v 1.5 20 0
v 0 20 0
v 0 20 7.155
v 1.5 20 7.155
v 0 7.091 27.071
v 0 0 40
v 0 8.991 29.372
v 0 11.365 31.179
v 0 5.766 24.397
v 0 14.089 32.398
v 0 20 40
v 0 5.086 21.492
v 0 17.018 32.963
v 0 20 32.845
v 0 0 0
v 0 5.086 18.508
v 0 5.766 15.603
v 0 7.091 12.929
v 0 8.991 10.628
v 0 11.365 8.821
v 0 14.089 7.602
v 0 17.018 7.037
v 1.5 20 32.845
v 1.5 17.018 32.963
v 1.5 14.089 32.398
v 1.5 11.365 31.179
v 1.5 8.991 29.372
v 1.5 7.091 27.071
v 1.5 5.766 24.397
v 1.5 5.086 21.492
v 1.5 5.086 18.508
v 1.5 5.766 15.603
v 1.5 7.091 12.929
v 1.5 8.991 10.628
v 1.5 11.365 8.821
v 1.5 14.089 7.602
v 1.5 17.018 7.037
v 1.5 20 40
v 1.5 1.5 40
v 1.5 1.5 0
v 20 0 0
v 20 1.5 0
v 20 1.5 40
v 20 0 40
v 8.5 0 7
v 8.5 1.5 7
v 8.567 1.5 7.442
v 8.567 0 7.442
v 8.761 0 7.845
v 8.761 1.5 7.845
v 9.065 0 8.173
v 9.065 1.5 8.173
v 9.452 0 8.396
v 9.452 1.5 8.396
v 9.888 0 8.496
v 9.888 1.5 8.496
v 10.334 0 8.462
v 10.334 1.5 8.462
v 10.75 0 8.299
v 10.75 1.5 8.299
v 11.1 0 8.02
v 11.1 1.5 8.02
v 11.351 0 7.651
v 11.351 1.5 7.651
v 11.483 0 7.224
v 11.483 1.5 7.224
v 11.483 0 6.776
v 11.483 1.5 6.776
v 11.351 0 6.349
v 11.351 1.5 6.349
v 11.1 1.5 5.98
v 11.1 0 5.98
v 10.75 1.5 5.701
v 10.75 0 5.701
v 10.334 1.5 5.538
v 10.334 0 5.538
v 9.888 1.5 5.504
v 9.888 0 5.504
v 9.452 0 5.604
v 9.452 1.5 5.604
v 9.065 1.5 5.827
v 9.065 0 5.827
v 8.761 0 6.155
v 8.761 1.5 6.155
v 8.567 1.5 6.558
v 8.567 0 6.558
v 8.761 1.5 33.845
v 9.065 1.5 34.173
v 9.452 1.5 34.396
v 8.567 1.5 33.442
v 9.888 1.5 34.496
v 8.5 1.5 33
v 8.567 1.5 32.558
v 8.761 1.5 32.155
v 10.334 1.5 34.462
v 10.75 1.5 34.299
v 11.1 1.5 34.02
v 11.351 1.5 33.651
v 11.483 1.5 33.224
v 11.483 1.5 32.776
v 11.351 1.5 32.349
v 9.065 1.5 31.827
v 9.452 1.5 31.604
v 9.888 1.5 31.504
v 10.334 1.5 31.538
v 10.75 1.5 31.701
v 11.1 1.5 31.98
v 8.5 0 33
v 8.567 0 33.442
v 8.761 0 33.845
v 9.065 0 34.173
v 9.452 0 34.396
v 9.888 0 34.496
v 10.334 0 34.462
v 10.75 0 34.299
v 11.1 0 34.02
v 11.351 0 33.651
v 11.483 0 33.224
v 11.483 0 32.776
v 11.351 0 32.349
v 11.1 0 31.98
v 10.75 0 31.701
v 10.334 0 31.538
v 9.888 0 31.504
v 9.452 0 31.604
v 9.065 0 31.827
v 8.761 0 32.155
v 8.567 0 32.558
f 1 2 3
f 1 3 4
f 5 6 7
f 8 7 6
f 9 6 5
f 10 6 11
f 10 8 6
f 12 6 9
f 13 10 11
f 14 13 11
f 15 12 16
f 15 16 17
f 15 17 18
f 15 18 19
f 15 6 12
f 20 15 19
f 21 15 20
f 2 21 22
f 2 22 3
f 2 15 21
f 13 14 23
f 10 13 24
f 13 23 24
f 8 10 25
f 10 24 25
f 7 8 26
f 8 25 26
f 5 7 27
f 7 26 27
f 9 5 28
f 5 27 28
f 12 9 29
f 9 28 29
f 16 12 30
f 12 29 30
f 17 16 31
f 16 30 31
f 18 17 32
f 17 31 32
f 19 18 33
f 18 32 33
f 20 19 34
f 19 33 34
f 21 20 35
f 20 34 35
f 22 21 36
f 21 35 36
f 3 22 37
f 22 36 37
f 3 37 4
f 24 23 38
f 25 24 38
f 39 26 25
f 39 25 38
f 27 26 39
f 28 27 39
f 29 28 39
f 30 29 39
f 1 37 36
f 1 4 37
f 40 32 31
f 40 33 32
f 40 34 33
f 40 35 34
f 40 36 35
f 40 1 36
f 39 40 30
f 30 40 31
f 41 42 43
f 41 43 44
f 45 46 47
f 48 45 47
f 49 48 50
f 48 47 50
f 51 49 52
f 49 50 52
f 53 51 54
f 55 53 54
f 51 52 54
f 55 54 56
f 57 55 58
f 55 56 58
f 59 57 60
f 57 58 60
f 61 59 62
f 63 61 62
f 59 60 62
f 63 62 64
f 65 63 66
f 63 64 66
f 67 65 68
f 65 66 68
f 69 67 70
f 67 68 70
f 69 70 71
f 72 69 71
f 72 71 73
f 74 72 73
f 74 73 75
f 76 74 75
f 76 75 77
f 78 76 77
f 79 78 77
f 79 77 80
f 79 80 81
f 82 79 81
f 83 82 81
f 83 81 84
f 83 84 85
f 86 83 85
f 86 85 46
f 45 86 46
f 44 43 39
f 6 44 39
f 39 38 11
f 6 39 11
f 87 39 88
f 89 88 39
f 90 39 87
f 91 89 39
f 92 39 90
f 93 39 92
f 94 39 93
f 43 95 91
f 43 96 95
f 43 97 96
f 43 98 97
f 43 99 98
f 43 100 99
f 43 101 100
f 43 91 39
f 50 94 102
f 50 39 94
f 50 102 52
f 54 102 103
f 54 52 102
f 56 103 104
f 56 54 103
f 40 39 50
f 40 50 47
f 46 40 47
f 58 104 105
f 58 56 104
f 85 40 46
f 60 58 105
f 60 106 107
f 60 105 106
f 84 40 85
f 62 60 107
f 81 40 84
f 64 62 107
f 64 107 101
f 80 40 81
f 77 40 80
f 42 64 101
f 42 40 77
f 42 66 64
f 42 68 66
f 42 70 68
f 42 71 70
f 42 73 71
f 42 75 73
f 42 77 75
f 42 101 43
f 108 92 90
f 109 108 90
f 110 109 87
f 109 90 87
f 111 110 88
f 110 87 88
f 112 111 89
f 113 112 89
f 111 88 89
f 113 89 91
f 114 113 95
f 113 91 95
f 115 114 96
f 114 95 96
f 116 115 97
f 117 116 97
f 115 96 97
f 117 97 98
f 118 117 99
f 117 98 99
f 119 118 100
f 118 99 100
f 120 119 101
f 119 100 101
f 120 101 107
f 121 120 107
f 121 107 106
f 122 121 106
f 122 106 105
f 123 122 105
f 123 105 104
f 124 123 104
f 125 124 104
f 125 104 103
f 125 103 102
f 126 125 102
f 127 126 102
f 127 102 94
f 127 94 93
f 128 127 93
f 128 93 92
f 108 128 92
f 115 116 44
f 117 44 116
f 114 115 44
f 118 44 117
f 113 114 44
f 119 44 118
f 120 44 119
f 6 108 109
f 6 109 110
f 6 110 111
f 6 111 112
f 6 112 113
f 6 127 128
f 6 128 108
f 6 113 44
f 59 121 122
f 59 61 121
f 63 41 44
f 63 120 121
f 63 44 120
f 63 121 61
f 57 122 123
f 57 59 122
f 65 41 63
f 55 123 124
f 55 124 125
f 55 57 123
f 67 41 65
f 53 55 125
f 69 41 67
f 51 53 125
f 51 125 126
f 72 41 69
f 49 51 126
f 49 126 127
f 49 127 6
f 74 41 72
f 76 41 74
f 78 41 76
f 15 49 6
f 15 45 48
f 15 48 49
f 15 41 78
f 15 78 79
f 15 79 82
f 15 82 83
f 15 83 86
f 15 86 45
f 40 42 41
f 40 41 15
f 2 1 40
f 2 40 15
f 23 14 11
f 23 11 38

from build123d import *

# Parameters (mm, degrees)
EXTRUSION1_DEPTH = 40
ESQUISSE2_R      = 13
EXTRUSION2_DEPTH = 30
ESQUISSE3_R      = 1.5
EXTRUSION3_DEPTH = 49.396797415


with BuildPart() as part:
    # Esquisse1 → Extrusion1 (new body)
    with BuildSketch(Plane.XY):
        Polygon((0, 0), (0, 20), (1.5, 20), (1.5, 1.5), (20, 1.5), (20, 0), align=None)
    extrude(amount=EXTRUSION1_DEPTH)

    # Esquisse2 → Extrusion2 (cut)
    with BuildSketch(Plane(origin=(1.5, 0, 0), x_dir=(0, 0, -1), z_dir=(1, 0, 0))):
        with Locations((-20, 18)):
            Circle(ESQUISSE2_R)
    extrude(amount=-EXTRUSION2_DEPTH, mode=Mode.SUBTRACT)

    # Esquisse3 → Extrusion3 (cut, through all)
    with BuildSketch(Plane(origin=(0, 1.5, 0), x_dir=(-1, 0, 0), z_dir=(0, 1, 0))):
        with Locations((-10, 33)):
            Circle(ESQUISSE3_R)
        with Locations((-10, 7)):
            Circle(ESQUISSE3_R)
    extrude(amount=-EXTRUSION3_DEPTH, mode=Mode.SUBTRACT)


solid = part.part
